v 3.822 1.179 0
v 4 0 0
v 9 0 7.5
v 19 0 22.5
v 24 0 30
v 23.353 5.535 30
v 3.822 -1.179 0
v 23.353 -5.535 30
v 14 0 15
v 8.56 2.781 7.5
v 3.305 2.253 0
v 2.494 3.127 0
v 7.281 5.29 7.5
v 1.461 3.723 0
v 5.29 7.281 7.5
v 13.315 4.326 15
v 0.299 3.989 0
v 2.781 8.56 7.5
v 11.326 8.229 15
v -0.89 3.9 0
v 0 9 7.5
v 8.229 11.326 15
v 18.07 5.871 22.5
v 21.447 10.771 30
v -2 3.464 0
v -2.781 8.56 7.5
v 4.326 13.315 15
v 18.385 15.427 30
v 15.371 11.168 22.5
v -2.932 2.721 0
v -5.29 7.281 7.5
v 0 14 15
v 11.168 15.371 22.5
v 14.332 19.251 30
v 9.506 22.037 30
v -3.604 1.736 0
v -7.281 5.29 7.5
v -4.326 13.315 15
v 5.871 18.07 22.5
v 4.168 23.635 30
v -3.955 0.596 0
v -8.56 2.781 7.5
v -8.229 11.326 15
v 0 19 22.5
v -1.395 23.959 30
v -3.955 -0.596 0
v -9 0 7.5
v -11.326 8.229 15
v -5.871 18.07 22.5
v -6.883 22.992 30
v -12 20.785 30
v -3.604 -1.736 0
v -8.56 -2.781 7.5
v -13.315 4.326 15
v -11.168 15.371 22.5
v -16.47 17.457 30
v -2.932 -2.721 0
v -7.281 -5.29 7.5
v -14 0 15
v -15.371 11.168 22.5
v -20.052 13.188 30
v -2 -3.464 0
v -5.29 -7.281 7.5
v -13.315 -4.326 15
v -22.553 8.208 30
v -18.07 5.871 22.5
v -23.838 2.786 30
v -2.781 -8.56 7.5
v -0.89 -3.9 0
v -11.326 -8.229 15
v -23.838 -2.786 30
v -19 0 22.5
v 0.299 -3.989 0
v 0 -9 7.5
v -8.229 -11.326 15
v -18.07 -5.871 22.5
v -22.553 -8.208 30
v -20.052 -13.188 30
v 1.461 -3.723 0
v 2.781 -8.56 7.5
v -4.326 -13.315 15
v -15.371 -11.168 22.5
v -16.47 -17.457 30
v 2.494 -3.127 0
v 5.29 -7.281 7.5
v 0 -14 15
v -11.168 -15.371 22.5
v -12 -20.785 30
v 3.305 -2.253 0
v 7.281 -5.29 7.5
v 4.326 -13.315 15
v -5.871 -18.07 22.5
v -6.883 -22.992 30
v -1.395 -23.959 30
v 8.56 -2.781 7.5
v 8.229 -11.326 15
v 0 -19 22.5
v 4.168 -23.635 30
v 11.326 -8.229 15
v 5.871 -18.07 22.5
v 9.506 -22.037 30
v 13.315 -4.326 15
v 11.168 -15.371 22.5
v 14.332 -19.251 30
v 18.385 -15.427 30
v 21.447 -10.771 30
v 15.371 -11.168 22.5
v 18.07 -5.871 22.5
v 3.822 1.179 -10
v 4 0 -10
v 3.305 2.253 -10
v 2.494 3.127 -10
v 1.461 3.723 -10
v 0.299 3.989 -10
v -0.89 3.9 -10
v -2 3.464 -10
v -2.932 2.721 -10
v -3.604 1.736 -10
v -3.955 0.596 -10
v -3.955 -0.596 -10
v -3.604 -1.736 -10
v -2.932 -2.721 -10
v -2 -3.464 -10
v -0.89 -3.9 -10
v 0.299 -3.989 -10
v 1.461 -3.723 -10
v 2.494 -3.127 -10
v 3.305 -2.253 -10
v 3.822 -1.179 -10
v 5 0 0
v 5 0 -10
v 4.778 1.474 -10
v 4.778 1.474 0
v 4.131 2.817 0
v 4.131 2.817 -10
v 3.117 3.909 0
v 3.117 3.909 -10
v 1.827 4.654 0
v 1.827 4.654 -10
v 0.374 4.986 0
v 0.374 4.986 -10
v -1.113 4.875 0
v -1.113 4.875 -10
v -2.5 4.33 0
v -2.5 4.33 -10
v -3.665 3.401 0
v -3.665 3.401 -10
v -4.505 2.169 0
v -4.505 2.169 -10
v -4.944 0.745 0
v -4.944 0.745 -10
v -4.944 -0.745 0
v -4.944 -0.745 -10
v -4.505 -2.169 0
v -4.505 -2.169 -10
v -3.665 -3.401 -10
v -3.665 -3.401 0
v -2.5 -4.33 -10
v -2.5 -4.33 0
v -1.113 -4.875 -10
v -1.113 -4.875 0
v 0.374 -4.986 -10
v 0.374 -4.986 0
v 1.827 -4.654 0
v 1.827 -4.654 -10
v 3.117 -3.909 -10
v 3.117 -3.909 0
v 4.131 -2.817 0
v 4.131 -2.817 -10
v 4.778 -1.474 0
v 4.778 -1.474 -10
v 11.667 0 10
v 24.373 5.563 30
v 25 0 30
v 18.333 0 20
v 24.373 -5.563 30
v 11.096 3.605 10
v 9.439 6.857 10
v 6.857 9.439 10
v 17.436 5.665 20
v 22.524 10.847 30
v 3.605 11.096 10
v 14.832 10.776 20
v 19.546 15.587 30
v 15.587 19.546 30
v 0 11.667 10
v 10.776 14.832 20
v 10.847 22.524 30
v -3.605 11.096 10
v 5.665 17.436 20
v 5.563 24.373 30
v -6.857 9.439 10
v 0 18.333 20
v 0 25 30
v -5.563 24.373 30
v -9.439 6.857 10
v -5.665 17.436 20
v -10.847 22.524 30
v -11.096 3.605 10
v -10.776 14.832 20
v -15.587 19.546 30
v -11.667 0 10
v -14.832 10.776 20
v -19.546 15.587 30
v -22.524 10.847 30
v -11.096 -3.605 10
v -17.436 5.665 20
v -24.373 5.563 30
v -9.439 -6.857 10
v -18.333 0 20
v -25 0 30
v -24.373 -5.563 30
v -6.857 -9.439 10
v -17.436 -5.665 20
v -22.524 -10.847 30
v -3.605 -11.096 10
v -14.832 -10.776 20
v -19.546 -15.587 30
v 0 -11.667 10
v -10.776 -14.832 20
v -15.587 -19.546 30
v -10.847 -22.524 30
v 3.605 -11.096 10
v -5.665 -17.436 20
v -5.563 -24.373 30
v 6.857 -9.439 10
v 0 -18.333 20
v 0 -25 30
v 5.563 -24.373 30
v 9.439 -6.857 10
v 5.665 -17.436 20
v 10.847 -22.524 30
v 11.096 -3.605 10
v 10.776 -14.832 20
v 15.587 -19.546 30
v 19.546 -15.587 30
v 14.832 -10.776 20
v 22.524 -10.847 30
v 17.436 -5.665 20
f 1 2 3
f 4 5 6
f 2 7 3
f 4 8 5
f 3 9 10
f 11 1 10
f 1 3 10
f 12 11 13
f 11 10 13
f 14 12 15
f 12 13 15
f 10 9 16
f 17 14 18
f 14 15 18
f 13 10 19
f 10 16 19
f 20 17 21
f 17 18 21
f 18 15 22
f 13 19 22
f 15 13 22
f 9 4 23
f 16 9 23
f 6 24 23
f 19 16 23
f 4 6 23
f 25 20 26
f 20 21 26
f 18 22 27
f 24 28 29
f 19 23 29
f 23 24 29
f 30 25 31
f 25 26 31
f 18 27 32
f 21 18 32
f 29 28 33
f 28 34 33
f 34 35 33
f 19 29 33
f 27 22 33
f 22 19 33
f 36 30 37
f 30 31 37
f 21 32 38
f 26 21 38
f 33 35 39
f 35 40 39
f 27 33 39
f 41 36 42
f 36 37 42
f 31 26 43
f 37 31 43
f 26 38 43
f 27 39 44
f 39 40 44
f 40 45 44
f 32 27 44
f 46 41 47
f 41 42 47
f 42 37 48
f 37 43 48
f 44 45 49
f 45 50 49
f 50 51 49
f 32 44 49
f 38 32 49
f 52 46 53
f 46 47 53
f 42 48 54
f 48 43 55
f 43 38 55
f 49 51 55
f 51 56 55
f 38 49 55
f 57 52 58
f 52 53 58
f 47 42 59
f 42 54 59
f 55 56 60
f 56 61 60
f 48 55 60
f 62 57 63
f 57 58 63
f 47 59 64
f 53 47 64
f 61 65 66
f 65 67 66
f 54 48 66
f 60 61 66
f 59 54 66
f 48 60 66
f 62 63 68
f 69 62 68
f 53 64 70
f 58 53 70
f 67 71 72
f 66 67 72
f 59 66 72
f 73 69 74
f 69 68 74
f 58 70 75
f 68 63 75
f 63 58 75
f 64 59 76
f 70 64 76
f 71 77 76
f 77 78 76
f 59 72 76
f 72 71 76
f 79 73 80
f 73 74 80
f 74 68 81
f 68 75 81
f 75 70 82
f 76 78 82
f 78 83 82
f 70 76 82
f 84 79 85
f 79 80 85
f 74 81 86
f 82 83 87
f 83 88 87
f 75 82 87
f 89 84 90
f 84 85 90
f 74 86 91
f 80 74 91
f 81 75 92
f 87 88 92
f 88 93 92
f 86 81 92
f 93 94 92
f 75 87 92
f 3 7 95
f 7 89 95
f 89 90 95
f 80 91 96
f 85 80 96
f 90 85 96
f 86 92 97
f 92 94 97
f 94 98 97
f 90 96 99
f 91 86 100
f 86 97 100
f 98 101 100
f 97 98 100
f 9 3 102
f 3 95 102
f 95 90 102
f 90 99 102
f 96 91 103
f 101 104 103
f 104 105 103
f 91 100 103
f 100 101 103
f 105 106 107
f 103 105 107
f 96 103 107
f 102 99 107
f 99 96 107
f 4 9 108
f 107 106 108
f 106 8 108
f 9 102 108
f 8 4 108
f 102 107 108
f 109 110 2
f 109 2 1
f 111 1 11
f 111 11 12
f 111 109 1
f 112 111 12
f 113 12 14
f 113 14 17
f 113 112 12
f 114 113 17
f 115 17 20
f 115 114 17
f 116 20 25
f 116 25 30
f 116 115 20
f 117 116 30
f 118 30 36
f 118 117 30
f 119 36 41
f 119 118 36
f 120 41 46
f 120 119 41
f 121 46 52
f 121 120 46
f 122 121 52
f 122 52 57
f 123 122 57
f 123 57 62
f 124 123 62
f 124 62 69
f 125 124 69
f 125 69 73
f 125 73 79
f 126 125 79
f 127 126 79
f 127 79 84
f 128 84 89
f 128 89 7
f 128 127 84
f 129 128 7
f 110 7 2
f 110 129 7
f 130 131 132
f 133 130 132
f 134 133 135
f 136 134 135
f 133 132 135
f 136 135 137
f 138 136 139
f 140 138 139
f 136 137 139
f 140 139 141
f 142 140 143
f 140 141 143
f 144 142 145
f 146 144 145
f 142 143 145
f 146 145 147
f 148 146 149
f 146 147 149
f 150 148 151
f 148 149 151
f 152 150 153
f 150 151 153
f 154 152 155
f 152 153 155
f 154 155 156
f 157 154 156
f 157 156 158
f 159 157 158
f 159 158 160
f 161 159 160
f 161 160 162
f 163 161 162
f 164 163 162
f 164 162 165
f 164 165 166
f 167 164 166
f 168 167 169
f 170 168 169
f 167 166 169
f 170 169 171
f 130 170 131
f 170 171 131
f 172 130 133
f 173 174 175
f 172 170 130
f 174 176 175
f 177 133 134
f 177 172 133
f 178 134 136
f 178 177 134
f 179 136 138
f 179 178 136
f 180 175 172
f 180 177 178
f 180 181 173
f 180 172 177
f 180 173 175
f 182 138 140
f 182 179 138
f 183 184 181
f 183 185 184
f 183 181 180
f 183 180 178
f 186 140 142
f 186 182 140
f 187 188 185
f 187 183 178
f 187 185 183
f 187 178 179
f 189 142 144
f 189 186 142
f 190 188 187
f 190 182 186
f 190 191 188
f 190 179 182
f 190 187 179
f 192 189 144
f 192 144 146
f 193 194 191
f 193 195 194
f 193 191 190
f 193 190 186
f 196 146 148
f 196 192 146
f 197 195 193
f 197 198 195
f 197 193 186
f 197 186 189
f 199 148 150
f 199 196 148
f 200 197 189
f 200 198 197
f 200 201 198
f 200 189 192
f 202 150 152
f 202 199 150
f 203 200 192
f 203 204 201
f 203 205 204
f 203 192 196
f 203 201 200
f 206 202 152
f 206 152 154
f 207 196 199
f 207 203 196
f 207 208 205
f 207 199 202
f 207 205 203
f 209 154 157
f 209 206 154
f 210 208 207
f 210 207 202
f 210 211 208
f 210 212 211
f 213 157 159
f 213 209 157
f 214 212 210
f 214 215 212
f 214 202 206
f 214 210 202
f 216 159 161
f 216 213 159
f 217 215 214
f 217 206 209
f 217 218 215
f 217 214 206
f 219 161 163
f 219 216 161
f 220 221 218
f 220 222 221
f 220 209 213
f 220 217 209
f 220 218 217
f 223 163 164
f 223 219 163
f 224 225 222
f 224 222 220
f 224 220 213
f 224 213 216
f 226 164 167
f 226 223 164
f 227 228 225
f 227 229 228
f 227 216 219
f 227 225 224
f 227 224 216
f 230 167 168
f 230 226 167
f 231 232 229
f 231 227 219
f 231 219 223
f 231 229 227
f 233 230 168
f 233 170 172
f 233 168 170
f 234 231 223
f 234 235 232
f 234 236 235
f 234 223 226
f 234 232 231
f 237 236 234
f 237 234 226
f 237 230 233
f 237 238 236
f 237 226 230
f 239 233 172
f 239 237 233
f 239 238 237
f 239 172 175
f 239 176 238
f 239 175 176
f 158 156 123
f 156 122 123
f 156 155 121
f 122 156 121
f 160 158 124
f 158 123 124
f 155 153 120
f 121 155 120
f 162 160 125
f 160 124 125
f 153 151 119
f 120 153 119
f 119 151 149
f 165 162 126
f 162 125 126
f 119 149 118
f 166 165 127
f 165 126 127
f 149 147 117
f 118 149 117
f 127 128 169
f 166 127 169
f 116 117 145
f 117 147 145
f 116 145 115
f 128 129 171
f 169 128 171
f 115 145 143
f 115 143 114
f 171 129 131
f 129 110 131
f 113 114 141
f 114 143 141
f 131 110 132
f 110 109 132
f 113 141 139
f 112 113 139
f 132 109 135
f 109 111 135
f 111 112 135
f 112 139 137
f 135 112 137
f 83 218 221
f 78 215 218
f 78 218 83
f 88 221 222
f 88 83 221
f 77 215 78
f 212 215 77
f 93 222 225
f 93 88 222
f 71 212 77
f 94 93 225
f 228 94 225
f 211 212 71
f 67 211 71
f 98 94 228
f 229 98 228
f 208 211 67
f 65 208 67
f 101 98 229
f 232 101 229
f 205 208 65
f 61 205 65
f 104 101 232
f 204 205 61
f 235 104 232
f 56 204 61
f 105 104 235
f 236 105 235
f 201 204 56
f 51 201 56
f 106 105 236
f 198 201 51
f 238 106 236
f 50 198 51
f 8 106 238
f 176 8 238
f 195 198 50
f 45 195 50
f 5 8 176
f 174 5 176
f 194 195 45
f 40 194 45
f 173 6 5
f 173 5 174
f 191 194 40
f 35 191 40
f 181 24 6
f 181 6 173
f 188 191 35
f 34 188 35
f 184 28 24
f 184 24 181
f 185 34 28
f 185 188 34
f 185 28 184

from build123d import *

# Parameters (mm, degrees)
CYLINDER001_R     = 4
CYLINDER001_DEPTH = 10
CYLINDER_R        = 5
CYLINDER_DEPTH    = 10


with BuildPart() as con001:
    # Cone001 → Cone001 (revolve)
    with BuildSketch(Plane.XZ):
        Polygon((0, 0), (4, 0), (24, 30), (0, 30), align=None)
    revolve(axis=Axis((0, 0, 0), (0, 0, 1)))


with BuildPart() as cut:
    # Cone → Cone (revolve)
    with BuildSketch(Plane.XZ):
        Polygon((0, 0), (5, 0), (25, 30), (0, 30), align=None)
    revolve(axis=Axis((0, 0, 0), (0, 0, 1)))

    # Cut: cut Con001
    add(con001.part, mode=Mode.SUBTRACT)


with BuildPart() as cilindre001:
    # Cylinder001 → Cylinder001 (new body)
    with BuildSketch(Plane.XY.offset(-10)):
        Circle(CYLINDER001_R)
    extrude(amount=CYLINDER001_DEPTH)


with BuildPart() as embut:
    # Cylinder → Cylinder (new body)
    with BuildSketch(Plane.XY.offset(-10)):
        Circle(CYLINDER_R)
    extrude(amount=CYLINDER_DEPTH)

    # Cut001: cut Cilindre001
    add(cilindre001.part, mode=Mode.SUBTRACT)

    # Fusion: union Cut
    add(cut.part)


solid = embut.part
